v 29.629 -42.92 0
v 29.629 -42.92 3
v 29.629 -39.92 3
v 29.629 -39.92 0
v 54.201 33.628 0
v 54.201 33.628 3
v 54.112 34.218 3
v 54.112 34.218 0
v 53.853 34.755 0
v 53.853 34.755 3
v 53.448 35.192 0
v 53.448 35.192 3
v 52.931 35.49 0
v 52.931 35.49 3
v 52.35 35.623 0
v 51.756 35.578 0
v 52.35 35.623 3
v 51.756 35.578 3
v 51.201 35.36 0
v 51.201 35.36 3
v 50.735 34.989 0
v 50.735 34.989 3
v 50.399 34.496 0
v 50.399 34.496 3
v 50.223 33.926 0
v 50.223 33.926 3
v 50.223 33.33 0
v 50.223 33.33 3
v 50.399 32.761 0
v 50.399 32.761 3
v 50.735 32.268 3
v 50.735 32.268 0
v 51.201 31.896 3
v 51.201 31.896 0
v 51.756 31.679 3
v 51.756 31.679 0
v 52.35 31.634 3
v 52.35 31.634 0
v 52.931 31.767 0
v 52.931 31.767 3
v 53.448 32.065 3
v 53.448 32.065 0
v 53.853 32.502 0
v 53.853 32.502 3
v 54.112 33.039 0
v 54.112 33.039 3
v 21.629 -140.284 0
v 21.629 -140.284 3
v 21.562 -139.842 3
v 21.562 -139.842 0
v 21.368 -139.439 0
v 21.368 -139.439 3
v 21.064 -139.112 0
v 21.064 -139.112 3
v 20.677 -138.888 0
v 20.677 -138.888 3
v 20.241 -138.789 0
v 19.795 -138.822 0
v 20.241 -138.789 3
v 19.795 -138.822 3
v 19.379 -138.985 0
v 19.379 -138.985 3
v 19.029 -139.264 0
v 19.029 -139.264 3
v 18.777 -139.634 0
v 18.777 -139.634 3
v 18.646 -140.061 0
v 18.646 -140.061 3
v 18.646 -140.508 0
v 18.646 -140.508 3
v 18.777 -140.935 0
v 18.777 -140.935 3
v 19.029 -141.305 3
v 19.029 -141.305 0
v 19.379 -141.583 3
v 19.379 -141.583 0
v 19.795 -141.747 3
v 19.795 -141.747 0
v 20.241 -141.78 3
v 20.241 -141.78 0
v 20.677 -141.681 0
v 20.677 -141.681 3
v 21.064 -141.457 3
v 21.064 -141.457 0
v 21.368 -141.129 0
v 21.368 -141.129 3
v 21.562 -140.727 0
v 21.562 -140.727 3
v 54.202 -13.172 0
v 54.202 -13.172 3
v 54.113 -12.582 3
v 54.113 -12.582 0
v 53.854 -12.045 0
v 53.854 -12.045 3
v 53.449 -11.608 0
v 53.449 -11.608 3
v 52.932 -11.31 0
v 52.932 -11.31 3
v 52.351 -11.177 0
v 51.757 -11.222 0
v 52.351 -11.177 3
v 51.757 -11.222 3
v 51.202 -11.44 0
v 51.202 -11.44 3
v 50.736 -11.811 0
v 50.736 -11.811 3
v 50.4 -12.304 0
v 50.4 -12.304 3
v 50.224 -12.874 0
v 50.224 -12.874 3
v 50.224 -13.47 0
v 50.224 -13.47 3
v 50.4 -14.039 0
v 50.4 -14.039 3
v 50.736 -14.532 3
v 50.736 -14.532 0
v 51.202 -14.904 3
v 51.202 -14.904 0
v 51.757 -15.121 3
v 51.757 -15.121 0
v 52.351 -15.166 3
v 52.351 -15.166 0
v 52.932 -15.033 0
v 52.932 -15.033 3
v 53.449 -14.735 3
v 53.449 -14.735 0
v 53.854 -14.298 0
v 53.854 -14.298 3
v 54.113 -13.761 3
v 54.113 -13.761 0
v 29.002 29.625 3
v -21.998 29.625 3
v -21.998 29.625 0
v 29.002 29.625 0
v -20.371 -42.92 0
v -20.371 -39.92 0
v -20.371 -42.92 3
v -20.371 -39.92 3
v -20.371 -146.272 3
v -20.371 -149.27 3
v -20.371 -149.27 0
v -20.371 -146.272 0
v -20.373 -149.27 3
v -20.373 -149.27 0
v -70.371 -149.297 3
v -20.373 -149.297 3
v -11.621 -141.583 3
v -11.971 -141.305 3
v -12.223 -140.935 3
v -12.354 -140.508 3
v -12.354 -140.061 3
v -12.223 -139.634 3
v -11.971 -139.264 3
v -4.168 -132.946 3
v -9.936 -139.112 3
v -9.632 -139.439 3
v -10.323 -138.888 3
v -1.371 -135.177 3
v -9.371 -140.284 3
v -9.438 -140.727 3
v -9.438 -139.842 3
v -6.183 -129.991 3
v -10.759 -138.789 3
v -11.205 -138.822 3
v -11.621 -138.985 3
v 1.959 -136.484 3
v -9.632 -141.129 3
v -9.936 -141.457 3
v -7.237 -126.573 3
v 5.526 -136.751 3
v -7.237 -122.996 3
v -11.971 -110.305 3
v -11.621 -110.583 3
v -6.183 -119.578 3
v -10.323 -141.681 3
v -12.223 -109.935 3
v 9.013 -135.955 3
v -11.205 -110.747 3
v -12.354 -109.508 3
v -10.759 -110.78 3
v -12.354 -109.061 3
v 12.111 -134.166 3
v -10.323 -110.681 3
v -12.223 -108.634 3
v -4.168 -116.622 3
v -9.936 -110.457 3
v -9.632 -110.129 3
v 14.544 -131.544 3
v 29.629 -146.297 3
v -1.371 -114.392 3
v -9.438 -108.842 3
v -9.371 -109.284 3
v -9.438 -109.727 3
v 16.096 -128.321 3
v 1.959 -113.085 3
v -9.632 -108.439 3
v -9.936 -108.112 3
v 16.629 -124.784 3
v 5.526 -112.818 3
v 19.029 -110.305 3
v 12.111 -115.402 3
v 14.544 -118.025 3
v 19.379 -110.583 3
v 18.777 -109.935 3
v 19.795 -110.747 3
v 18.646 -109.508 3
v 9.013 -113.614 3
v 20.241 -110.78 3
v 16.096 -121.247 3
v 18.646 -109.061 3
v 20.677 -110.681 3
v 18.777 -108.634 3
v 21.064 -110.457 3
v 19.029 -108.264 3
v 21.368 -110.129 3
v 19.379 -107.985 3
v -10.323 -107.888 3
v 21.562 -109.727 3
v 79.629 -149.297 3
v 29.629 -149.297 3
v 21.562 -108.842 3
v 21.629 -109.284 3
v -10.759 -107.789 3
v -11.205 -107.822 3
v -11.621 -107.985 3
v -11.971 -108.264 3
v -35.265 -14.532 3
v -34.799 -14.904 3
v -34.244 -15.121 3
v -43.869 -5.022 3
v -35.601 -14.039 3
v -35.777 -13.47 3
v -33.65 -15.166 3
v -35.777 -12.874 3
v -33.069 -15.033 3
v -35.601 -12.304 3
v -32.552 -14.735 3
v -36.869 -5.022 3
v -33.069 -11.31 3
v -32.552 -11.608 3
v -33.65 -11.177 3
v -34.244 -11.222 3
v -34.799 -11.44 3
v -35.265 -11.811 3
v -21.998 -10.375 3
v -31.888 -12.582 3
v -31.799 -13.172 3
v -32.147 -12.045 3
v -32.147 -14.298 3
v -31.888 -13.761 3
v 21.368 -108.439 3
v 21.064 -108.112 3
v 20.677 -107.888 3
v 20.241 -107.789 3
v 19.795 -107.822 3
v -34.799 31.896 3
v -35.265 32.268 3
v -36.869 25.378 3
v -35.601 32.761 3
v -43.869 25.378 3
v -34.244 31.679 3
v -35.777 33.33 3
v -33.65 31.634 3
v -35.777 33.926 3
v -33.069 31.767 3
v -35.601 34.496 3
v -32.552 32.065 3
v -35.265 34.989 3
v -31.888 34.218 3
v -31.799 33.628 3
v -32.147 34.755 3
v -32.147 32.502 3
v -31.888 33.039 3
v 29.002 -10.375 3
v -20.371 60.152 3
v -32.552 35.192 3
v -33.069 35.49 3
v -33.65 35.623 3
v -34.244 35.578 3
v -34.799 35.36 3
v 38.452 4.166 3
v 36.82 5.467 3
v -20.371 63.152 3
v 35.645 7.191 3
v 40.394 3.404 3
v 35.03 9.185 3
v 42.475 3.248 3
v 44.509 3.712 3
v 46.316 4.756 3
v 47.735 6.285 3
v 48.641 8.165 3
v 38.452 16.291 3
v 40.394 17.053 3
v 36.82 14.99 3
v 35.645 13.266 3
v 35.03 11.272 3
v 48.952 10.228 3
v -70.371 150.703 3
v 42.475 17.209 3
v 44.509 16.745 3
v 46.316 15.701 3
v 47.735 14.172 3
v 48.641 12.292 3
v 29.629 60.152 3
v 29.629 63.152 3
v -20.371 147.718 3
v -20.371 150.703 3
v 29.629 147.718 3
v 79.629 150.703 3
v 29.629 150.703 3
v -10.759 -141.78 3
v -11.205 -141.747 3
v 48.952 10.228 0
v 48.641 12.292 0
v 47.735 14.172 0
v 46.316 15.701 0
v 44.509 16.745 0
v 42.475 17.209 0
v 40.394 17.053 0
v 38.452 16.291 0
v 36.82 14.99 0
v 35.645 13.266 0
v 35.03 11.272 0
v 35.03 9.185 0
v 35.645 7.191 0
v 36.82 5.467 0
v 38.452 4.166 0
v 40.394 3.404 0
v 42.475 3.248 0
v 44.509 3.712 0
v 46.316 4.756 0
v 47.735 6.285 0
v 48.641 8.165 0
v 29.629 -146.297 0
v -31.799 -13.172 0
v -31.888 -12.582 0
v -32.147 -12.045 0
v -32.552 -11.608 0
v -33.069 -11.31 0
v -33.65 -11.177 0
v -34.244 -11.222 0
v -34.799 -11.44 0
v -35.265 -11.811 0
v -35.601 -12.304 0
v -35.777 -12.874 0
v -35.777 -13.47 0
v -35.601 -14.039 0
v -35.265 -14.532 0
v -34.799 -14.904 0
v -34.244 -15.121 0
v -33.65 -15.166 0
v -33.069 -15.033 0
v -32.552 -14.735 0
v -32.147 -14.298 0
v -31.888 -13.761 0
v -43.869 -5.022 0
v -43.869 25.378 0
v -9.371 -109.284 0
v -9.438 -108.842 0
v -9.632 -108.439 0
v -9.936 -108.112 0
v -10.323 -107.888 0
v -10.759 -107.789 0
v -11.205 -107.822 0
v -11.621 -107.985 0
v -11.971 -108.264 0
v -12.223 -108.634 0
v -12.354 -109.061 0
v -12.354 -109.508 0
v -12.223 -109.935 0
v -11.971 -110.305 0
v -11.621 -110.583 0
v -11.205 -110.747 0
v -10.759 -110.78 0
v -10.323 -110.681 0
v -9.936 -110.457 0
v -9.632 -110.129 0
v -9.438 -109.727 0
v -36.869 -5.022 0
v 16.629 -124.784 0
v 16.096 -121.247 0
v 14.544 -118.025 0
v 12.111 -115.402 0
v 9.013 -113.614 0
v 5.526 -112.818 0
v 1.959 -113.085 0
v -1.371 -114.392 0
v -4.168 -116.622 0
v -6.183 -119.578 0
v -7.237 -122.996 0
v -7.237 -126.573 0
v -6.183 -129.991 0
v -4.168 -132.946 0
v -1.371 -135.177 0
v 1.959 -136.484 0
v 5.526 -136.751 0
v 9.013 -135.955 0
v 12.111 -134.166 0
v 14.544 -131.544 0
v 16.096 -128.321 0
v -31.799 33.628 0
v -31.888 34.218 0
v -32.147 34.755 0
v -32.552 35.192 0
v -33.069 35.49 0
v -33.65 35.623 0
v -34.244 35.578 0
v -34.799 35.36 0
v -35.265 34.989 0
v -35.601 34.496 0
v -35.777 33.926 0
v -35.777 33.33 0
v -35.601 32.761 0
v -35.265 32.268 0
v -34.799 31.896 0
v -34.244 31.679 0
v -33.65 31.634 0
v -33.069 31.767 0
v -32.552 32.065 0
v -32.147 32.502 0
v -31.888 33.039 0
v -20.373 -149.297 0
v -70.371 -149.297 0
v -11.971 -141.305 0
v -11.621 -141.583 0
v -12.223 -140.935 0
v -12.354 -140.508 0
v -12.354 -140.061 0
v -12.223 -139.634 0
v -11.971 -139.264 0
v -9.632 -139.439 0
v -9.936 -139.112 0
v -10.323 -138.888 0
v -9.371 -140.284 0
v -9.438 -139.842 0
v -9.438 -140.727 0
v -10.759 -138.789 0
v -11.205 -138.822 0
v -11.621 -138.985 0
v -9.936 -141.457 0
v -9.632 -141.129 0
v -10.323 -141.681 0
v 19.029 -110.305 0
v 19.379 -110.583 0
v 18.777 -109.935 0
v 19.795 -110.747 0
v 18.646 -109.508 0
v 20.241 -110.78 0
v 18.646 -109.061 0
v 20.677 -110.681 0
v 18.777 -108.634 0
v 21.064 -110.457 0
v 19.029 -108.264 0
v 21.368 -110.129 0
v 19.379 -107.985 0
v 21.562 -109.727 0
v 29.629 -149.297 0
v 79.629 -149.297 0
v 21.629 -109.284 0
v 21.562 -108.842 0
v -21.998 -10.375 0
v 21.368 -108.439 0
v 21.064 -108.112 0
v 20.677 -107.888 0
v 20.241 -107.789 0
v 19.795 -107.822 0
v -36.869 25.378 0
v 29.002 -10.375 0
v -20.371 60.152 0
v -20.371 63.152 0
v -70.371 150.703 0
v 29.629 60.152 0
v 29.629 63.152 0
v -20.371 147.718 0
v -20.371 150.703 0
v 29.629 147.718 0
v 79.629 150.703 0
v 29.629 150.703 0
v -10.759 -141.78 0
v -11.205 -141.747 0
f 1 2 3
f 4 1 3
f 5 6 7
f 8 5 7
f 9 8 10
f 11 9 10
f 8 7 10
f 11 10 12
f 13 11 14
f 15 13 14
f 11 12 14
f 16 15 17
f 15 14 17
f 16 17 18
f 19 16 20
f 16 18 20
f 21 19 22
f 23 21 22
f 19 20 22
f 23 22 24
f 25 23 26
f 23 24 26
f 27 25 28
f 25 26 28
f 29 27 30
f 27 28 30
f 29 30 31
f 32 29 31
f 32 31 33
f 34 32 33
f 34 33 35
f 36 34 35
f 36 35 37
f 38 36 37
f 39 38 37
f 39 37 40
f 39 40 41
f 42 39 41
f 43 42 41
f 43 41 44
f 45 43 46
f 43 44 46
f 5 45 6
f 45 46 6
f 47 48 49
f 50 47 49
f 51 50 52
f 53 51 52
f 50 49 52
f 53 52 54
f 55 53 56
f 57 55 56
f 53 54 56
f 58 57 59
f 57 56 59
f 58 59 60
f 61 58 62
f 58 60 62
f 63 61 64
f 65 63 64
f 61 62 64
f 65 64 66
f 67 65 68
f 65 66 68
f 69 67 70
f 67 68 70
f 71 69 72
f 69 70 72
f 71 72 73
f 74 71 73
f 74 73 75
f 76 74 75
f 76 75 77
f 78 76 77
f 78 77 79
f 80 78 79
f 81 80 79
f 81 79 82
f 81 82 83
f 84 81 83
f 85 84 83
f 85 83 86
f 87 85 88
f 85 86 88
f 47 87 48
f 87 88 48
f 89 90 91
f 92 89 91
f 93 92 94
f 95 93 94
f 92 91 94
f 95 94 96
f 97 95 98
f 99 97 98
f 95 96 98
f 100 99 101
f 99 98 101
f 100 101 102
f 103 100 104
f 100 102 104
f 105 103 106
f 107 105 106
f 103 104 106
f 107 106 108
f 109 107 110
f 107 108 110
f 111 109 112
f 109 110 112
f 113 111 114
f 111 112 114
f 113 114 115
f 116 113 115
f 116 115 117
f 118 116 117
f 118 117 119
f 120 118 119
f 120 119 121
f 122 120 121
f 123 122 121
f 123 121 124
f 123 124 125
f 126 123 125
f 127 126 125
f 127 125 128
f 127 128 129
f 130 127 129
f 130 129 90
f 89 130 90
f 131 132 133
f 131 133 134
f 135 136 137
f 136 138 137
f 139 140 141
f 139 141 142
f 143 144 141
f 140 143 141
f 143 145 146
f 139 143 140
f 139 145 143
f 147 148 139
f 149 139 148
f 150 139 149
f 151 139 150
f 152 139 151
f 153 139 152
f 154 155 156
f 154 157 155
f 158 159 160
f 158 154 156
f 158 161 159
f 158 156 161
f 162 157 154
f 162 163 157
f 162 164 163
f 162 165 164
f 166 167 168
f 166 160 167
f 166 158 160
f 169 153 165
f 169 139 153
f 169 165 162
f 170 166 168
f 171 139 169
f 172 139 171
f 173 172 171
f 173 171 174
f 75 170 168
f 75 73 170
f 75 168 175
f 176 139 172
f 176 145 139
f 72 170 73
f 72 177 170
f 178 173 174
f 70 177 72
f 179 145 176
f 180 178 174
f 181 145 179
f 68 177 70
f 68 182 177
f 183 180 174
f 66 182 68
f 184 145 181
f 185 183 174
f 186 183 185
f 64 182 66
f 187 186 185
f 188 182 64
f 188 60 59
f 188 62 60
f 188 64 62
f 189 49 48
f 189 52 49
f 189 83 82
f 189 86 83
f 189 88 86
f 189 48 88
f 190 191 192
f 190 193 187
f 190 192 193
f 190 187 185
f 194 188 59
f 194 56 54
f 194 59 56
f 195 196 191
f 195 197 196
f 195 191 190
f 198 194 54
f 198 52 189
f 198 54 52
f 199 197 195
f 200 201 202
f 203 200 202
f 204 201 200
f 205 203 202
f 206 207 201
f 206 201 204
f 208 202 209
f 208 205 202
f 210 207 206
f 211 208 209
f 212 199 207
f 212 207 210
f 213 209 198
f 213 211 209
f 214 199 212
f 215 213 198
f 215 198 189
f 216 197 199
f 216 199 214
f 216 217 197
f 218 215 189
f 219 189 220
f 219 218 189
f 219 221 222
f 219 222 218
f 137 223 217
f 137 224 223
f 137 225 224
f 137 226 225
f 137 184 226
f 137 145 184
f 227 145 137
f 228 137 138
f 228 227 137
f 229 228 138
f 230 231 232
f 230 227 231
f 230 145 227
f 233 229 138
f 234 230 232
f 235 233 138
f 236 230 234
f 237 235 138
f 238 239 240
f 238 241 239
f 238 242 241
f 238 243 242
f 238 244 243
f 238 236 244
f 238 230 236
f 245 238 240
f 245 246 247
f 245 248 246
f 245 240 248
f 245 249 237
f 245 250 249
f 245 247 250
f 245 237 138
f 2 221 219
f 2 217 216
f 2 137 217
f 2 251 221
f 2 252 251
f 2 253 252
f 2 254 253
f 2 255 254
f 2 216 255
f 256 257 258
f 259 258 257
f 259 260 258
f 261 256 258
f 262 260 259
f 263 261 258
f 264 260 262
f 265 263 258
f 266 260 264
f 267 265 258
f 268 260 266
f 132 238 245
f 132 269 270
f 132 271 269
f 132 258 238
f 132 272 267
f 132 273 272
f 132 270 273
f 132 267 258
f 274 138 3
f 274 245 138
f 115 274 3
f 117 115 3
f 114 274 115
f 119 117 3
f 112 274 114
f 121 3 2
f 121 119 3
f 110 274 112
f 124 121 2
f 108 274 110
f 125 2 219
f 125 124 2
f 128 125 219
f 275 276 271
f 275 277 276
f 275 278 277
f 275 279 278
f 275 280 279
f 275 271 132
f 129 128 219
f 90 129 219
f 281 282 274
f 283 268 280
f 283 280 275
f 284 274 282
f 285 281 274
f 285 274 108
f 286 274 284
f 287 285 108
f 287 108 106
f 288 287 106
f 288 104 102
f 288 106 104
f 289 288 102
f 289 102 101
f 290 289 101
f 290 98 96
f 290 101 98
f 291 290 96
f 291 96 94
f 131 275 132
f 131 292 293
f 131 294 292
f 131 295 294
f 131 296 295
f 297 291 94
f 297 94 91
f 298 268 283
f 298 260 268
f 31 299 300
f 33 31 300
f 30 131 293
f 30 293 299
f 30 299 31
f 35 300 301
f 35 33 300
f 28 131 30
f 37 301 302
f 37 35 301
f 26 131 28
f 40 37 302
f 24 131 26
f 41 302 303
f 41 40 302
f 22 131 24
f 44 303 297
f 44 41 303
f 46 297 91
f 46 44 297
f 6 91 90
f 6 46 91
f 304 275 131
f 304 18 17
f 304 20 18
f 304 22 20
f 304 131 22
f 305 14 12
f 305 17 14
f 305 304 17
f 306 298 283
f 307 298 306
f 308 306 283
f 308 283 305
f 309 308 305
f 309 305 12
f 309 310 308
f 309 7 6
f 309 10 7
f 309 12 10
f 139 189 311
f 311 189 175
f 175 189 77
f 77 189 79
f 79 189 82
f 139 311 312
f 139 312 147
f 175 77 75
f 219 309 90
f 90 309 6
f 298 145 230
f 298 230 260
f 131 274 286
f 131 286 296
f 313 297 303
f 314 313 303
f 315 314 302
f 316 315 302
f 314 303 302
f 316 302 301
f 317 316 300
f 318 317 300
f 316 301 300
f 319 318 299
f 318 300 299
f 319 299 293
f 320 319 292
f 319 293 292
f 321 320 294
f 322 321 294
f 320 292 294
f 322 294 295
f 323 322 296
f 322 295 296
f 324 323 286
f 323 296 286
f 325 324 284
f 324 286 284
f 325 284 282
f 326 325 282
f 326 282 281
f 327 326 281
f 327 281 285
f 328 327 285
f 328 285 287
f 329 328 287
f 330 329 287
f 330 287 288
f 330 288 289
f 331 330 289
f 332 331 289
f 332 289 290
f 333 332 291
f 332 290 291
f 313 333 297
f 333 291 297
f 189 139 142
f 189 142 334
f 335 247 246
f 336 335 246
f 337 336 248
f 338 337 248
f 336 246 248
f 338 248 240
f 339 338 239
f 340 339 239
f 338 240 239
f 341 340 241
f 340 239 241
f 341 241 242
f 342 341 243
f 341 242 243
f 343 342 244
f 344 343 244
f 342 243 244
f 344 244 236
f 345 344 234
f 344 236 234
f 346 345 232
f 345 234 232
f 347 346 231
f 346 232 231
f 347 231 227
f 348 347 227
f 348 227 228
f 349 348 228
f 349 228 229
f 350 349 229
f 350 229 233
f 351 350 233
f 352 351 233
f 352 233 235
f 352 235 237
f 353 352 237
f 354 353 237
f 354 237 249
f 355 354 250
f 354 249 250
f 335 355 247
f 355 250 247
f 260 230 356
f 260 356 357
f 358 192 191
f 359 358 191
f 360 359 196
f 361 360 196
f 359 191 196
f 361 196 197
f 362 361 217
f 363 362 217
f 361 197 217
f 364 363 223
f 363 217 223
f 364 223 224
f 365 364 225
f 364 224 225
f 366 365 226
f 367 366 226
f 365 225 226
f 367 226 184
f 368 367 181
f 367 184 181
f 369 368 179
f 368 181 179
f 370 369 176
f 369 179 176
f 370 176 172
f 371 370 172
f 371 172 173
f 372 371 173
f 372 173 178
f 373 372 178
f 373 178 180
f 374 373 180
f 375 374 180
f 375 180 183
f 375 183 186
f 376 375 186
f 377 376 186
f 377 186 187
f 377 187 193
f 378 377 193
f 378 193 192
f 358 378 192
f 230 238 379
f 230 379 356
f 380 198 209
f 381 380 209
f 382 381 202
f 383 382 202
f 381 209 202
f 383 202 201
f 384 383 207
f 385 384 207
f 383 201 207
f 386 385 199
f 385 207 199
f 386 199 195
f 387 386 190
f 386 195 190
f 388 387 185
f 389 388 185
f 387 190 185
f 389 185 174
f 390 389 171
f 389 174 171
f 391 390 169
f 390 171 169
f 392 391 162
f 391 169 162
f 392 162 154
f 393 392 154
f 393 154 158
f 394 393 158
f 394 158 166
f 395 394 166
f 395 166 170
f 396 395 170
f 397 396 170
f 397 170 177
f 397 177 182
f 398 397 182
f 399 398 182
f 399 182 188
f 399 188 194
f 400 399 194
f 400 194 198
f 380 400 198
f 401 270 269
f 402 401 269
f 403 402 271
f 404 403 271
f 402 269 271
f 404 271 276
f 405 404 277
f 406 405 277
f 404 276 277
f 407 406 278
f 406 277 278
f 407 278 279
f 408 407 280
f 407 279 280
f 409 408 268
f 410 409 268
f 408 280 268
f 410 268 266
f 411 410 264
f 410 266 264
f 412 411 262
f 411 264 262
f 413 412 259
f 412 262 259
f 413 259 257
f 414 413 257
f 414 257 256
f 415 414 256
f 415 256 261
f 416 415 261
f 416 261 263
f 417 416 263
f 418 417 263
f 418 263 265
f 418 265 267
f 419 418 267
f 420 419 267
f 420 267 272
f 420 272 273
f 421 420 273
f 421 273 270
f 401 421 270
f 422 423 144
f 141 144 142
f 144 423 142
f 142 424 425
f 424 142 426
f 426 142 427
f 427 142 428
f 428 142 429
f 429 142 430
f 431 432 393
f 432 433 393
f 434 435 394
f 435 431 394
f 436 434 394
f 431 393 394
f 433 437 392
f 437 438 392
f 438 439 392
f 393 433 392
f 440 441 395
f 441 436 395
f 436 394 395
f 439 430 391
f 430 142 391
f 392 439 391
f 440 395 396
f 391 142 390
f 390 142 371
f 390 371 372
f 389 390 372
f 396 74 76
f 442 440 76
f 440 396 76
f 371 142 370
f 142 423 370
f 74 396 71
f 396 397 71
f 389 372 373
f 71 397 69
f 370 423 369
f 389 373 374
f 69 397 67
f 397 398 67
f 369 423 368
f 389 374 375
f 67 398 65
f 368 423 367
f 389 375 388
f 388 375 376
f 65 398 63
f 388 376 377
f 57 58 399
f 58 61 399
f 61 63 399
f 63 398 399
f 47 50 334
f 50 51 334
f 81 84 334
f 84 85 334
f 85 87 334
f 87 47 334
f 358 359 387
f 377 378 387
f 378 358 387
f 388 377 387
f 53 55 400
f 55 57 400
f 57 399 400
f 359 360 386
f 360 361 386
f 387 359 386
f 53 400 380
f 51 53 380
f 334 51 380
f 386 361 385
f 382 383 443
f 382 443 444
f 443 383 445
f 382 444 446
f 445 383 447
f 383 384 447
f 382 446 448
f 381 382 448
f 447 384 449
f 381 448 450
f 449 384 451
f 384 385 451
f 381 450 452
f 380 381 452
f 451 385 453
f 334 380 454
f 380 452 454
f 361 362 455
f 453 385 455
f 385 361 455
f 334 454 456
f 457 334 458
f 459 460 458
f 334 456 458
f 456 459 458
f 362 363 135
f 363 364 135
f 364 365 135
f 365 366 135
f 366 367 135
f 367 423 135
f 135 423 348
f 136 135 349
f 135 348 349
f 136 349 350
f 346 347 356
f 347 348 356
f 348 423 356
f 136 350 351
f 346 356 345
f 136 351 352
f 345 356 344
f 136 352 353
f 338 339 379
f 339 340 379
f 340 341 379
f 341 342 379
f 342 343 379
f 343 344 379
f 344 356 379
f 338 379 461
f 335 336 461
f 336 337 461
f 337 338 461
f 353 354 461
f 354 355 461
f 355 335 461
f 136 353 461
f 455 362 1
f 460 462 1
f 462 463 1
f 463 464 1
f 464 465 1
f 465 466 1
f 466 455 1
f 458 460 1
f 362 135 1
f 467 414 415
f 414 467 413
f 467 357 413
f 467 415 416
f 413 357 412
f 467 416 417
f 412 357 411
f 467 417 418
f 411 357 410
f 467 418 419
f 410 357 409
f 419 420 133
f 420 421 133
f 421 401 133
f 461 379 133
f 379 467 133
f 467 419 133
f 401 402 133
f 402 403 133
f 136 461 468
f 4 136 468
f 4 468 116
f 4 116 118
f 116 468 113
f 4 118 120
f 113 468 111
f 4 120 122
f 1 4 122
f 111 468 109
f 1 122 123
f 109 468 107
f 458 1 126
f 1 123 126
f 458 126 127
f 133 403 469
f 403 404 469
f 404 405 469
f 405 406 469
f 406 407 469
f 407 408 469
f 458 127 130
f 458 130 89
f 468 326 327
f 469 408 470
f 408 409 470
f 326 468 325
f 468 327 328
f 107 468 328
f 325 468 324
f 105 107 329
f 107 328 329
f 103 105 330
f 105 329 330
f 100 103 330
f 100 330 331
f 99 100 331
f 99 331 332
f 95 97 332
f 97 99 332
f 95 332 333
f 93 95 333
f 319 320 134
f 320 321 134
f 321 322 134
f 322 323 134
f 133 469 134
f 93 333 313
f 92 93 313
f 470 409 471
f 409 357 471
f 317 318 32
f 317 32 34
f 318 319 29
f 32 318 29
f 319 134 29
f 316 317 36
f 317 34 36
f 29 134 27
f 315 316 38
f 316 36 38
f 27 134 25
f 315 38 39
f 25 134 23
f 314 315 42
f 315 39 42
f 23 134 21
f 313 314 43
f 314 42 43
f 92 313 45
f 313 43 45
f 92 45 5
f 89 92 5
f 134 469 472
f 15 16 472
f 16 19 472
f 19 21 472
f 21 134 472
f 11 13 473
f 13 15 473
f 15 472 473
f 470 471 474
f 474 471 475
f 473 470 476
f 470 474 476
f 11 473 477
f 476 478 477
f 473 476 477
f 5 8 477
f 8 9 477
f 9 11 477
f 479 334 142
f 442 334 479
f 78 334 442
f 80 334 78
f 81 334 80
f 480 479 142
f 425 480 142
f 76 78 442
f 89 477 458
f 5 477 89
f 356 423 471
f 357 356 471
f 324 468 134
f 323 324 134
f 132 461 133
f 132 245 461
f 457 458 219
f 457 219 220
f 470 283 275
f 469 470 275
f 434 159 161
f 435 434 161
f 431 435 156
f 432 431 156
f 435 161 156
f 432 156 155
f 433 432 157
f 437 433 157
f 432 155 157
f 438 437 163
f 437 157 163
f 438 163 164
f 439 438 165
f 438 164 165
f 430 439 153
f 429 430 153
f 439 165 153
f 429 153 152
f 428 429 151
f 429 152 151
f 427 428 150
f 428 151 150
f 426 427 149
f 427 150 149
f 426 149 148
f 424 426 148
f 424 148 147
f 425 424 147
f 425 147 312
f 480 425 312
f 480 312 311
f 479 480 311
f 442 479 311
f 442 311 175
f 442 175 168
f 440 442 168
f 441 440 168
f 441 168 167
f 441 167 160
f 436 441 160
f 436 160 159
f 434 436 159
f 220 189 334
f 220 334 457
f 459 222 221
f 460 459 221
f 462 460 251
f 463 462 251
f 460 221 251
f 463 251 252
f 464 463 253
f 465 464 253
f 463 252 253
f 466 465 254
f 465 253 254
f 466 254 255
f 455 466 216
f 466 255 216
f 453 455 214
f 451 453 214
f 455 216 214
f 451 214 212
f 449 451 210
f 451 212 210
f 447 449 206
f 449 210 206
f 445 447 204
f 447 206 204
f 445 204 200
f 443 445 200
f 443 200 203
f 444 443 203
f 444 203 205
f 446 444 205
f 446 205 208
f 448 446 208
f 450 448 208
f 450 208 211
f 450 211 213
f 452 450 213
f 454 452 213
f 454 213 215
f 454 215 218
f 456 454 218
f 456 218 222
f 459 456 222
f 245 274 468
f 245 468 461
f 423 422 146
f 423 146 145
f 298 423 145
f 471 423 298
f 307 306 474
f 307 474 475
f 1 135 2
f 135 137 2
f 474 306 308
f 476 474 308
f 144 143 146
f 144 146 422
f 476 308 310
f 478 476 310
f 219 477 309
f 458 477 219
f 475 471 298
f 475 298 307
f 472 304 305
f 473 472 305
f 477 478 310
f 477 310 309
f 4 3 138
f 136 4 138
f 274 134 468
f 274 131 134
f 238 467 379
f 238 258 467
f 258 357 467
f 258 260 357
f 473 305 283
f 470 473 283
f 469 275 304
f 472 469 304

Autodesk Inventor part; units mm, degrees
ref_plane "YZ Plane" through (0, 0, 0) normal (1, 0, 0) x (0, 1, 0)
ref_plane "XZ Plane" through (0, 0, 0) normal (0, 1, 0) x (-1, 0, 0)
ref_plane "XY Plane" through (0, 0, 0) normal (0, 0, 1) x (1, 0, 0)
sketch "Sketch1" plane through (0, 0, 0) normal (0, 0, 1) x (1, 0, 0)
  line L0 (-70.3712, 150.7033) -> (79.6288, 150.7033)
  line L1 (79.6288, 150.7033) -> (79.6288, -149.2967)
  line L2 (79.6288, -149.2967) -> (-70.3712, -149.2967)
  line L3 (-70.3712, -149.2967) -> (-70.3712, 150.7033)
  point P0 (0, 0)
extrude "Extrusion1" add sketch "Sketch1" along normal blind 3
sketch "Sketch2" plane through (0, 0, 3) normal (0, 0, 1) x (1, 0, 0)
  line L0 (-70.3712, 150.7033) -> (-70.3712, -149.2967) projected
  line L1 (-70.3712, 271.0495) -> (-120.3712, 271.0495)
  line L2 (-20.3712, 147.7184) -> (-20.3712, 150.7184)
  line L3 (-20.3712, 147.7184) -> (29.6288, 147.7184)
  line L4 (29.6288, 147.7184) -> (29.6288, 150.7184)
  line L5 (-20.3712, 150.7184) -> (29.6288, 150.7184)
  line L6 (79.6288, 150.7033) -> (-70.3712, 150.7033) projected
  point P0 (0, 0)
  dimension "d9" = 50
extrude "Extrusion2" cut sketch "Sketch2" against normal blind 3
sketch "Sketch3" plane through (0, 0, 3) normal (0, 0, 1) x (1, 0, 0)
  line L0 (-20.3712, 150.7033) -> (-20.3712, 147.7184) projected
  line L1 (-20.3712, -149.2722) -> (29.6288, -149.2967)
  line L2 (79.6288, -149.2967) -> (-70.3712, -149.2967) projected
  line L3 (-20.3712, -149.2722) -> (-20.3712, -146.2722)
  line L4 (-20.3712, -146.2722) -> (29.6288, -146.2967)
  line L5 (29.6288, -146.2967) -> (29.6288, -149.2967)
  point P0 (0, 0)
extrude "Extrusion3" cut sketch "Sketch3" against normal blind 3
sketch "Sketch4" plane through (0, 0, 3) normal (0, 0, 1) x (1, 0, 0)
  line L0 (29.6288, -46.2722) -> (-20.3712, -46.2722)
  line L1 (-20.3712, -46.2722) -> (29.6288, -46.2722)
  line L2 (29.6288, -46.2722) -> (29.6288, -43.6172)
  line L3 (29.6288, -43.6172) -> (-20.3712, -43.6172)
  line L4 (-20.3712, -43.6172) -> (-20.3712, -46.2722)
  point P0 (0, 0)
extrude "Extrusion4" add sketch "Sketch4" against normal blind 3
sketch "Sketch5" plane through (0, 0, 3) normal (0, 0, 1) x (1, 0, 0)
  line L0 (-20.3712, -42.9205) -> (29.6288, -42.9205)
  line L1 (29.6288, -42.9205) -> (29.6288, -39.9205)
  line L2 (29.6288, -39.9205) -> (-20.3712, -39.9205)
  line L3 (-20.3712, -39.9205) -> (-20.3712, -42.9205)
  point P0 (0, 0)
  point P1 (-20.3712, -146.2722)
  point P2 (29.6288, -146.2967)
extrude "Extrusion5" cut sketch "Sketch5" against normal blind 3
sketch "Sketch6" plane through (0, 0, 3) normal (0, 0, 1) x (1, 0, 0)
  line L0 (29.6288, -39.9205) -> (-20.3712, -39.9205) projected
  line L1 (-20.3712, 60.1524) -> (29.6288, 60.1524)
  line L2 (29.6288, 60.1524) -> (29.6288, 63.1524)
  line L3 (29.6288, 63.1524) -> (-20.3712, 63.1524)
  line L4 (-20.3712, 63.1524) -> (-20.3712, 60.1524)
  point P0 (0, 0)
extrude "Extrusion6" cut sketch "Sketch6" against normal blind 3
sketch "Sketch7" plane through (0, 0, 3) normal (0, 0, 1) x (1, 0, 0)
  line L0 (29.6288, -149.2967) -> (-70.3712, -149.2967) projected
  line L1 (-70.3712, -149.2967) -> (-70.3712, 150.7033) projected
  circle A0 centre (4.6288, -99.2967) radius 12
  point P0 (0, 0)
extrude "Extrusion7" cut sketch "Sketch7" against normal blind 3
sketch "Sketch8" plane through (0, 0, 3) normal (0, 0, 1) x (1, 0, 0)
  circle A0 centre (4.6288, -99.2967) radius 12 projected
  circle A1 centre (20.6853, -83.2968) radius 1.5
  circle A2 centre (-11.3147, -83.2968) radius 1.5
  circle A3 centre (-11.3712, -115.2967) radius 1.5
  circle A4 centre (20.6288, -115.2967) radius 1.5
  point P0 (0, 0)
extrude "Extrusion8" cut sketch "Sketch8" against normal blind 3 contours A1 | A2 | A3 | A4
sketch "Sketch9" plane through (0, 0, 3) normal (0, 0, 1) x (1, 0, 0)
  point P0 (0, 0)
sketch "Sketch11" plane through (0, 0, 3) normal (0, 0, 1) x (1, 0, 0)
  line L0 (-70.3712, 150.7033) -> (-70.3712, -149.2967) projected
  line L1 (79.6288, -149.2967) -> (79.6288, 150.7033) projected
  line L2 (29.6288, 60.1524) -> (-20.3712, 60.1524) projected
  line L3 (-20.3712, -39.9205) -> (29.6288, -39.9205) projected
  circle A0 centre (52.2007, 33.6284) radius 2
  circle A1 centre (52.2018, -13.1716) radius 2
  circle A2 centre (-33.7993, 33.6284) radius 2
  circle A3 centre (-33.7993, -13.1716) radius 2
  line L4 (-43.8689, 25.3776) -> (-36.8689, 25.3776)
  line L5 (-36.8689, 25.3776) -> (-36.8689, -5.0217)
  line L6 (-36.8689, -5.0217) -> (-43.8689, -5.0217)
  line L7 (-43.8689, -5.0217) -> (-43.8689, 25.3776)
  circle A4 centre (41.9518, 10.2284) radius 7
  line L8 (29.0018, -10.3751) -> (-21.9982, -10.3751)
  line L9 (-21.9982, -10.3751) -> (-21.9982, 29.6249)
  line L10 (-21.9982, 29.6249) -> (29.0018, 29.6249)
  line L11 (29.0018, 29.6249) -> (29.0018, -10.3751)
  point P0 (0, 0)
extrude "Extrusion9" cut sketch "Sketch11" against normal blind 30
sketch "Sketch12" plane through (29.6288, -149.2967, 3) normal (0.0005, 1, 0) x (1, -0.0005, 0)
  line L0 (-100, 0) -> (0, 0) projected
  line L1 (-50.0015, 3) -> (0, 3)
  line L2 (0, 3) -> (0, 0)
  line L3 (0, 0) -> (-50.0015, 0)
  line L4 (-50.0015, 0) -> (-50.0015, 3)
  point P0 (-29.7019, 3)
extrude "Extrusion10" cut sketch "Sketch12" against normal blind 10
sketch "Sketch13" plane through (0, 0, 3) normal (0, 0, 1) x (1, 0, 0)
  line L0 (29.6288, -146.2967) -> (-20.3712, -146.2722) projected
  circle A0 centre (-11.3147, -83.2968) radius 1.5 projected
  circle A1 centre (-11.3712, -115.2967) radius 1.5 projected
  line L1 (-11.3712, -115.2967) -> (-11.3147, -83.2968)
  circle A2 centre (20.6853, -83.2968) radius 1.5 projected
  line L2 (20.6853, -83.2968) -> (-11.3147, -83.2968)
  line L3 (20.6853, -115.2967) -> (20.6853, -83.2968)
  line L4 (20.6853, -115.2967) -> (-11.3712, -115.2967)
  circle A3 centre (4.6288, -99.2967) radius 12 projected
  line L5 (4.6288, -146.2844) -> (4.6288, -131.2844)
  circle A4 centre (-11.3147, -83.2968) radius 1.5
  circle A5 centre (20.6853, -83.2968) radius 1.5
  circle A6 centre (20.6853, -115.2967) radius 1.455
  circle A7 centre (-11.3712, -115.2967) radius 1.5
  point P0 (0, 0)
  dimension "d107" = 15
  dimension "d108" = 32.0565
  dimension "d109" = 31.9999
extrude "Extrusion11" add sketch "Sketch13" against normal blind 3 contours L2 L1 A0 | A0 L1 L2 | L2 L3 A2 | A2 L3 L2 | L1 L4 A1 | A1 L4 L1 | A6 L4 L3 | L3 L4 A6
sketch "Sketch14" plane through (0, 0, 3) normal (0, 0, 1) x (1, 0, 0)
  arc A0 (21.8331, -114.4024) -> (21.8331, -116.1909) centre (20.6288, -115.2967) ccw projected
  circle A1 centre (20.6288, -115.2967) radius 2.2964
  point P0 (0, 0)
extrude "Extrusion12" cut sketch "Sketch14" against normal blind 3
sketch "Sketch15" plane through (0, 0, 3) normal (0, 0, 1) x (1, 0, 0)
  line L0 (17.3499, -111.5348) -> (24.4453, -111.5348)
  line L1 (24.4453, -111.5348) -> (24.4453, -120.5742)
  line L2 (24.4453, -120.5742) -> (17.3499, -120.5742)
  line L3 (17.3499, -120.5742) -> (17.3499, -111.5348)
  point P0 (0, 0)
extrude "Extrusion13" cut sketch "Sketch15" against normal blind 3
sketch "Sketch16" plane through (0, 0, 3) normal (0, 0, 1) x (1, 0, 0)
  line L0 (17.3499, -111.5348) -> (24.4453, -111.5348) projected
  line L1 (24.4453, -120.5742) -> (17.3499, -120.5742) projected
  line L2 (17.3499, -111.5348) -> (24.4453, -111.5348)
  line L3 (24.4453, -111.5348) -> (24.4453, -120.5742)
  line L4 (24.4453, -120.5742) -> (17.3499, -120.5742)
  line L5 (17.3499, -120.5742) -> (17.3499, -111.5348)
  point P0 (0, 0)
extrude "Extrusion14" add sketch "Sketch16" against normal blind 3
sketch "Sketch17" plane through (0, 0, 3) normal (0, 0, 1) x (1, 0, 0)
  circle A0 centre (4.6288, -99.2967) radius 12 projected
  circle A1 centre (4.6288, -99.2967) radius 12
  point P0 (0, 0)
extrude "Extrusion15" add sketch "Sketch17" against normal blind 3
sketch "Sketch18" plane through (0, 0, 3) normal (0, 0, 1) x (1, 0, 0)
  line L0 (29.6288, -146.2967) -> (-20.3712, -146.2722) projected
  circle A0 centre (-10.8712, -109.2844) radius 1.5
  circle A1 centre (20.1288, -109.2844) radius 1.5
  circle A2 centre (20.1288, -140.2844) radius 1.5
  circle A3 centre (-10.8712, -140.2844) radius 1.5
  circle A4 centre (4.6288, -124.7844) radius 12
  point P0 (0, 0)
extrude "Extrusion16" cut sketch "Sketch18" against normal blind 35.75
sketch "Sketch19" plane through (0, 0, 3) normal (0, 0, 1) x (1, 0, 0)
  point P0 (0, 0)
properties part number "MuurL"
